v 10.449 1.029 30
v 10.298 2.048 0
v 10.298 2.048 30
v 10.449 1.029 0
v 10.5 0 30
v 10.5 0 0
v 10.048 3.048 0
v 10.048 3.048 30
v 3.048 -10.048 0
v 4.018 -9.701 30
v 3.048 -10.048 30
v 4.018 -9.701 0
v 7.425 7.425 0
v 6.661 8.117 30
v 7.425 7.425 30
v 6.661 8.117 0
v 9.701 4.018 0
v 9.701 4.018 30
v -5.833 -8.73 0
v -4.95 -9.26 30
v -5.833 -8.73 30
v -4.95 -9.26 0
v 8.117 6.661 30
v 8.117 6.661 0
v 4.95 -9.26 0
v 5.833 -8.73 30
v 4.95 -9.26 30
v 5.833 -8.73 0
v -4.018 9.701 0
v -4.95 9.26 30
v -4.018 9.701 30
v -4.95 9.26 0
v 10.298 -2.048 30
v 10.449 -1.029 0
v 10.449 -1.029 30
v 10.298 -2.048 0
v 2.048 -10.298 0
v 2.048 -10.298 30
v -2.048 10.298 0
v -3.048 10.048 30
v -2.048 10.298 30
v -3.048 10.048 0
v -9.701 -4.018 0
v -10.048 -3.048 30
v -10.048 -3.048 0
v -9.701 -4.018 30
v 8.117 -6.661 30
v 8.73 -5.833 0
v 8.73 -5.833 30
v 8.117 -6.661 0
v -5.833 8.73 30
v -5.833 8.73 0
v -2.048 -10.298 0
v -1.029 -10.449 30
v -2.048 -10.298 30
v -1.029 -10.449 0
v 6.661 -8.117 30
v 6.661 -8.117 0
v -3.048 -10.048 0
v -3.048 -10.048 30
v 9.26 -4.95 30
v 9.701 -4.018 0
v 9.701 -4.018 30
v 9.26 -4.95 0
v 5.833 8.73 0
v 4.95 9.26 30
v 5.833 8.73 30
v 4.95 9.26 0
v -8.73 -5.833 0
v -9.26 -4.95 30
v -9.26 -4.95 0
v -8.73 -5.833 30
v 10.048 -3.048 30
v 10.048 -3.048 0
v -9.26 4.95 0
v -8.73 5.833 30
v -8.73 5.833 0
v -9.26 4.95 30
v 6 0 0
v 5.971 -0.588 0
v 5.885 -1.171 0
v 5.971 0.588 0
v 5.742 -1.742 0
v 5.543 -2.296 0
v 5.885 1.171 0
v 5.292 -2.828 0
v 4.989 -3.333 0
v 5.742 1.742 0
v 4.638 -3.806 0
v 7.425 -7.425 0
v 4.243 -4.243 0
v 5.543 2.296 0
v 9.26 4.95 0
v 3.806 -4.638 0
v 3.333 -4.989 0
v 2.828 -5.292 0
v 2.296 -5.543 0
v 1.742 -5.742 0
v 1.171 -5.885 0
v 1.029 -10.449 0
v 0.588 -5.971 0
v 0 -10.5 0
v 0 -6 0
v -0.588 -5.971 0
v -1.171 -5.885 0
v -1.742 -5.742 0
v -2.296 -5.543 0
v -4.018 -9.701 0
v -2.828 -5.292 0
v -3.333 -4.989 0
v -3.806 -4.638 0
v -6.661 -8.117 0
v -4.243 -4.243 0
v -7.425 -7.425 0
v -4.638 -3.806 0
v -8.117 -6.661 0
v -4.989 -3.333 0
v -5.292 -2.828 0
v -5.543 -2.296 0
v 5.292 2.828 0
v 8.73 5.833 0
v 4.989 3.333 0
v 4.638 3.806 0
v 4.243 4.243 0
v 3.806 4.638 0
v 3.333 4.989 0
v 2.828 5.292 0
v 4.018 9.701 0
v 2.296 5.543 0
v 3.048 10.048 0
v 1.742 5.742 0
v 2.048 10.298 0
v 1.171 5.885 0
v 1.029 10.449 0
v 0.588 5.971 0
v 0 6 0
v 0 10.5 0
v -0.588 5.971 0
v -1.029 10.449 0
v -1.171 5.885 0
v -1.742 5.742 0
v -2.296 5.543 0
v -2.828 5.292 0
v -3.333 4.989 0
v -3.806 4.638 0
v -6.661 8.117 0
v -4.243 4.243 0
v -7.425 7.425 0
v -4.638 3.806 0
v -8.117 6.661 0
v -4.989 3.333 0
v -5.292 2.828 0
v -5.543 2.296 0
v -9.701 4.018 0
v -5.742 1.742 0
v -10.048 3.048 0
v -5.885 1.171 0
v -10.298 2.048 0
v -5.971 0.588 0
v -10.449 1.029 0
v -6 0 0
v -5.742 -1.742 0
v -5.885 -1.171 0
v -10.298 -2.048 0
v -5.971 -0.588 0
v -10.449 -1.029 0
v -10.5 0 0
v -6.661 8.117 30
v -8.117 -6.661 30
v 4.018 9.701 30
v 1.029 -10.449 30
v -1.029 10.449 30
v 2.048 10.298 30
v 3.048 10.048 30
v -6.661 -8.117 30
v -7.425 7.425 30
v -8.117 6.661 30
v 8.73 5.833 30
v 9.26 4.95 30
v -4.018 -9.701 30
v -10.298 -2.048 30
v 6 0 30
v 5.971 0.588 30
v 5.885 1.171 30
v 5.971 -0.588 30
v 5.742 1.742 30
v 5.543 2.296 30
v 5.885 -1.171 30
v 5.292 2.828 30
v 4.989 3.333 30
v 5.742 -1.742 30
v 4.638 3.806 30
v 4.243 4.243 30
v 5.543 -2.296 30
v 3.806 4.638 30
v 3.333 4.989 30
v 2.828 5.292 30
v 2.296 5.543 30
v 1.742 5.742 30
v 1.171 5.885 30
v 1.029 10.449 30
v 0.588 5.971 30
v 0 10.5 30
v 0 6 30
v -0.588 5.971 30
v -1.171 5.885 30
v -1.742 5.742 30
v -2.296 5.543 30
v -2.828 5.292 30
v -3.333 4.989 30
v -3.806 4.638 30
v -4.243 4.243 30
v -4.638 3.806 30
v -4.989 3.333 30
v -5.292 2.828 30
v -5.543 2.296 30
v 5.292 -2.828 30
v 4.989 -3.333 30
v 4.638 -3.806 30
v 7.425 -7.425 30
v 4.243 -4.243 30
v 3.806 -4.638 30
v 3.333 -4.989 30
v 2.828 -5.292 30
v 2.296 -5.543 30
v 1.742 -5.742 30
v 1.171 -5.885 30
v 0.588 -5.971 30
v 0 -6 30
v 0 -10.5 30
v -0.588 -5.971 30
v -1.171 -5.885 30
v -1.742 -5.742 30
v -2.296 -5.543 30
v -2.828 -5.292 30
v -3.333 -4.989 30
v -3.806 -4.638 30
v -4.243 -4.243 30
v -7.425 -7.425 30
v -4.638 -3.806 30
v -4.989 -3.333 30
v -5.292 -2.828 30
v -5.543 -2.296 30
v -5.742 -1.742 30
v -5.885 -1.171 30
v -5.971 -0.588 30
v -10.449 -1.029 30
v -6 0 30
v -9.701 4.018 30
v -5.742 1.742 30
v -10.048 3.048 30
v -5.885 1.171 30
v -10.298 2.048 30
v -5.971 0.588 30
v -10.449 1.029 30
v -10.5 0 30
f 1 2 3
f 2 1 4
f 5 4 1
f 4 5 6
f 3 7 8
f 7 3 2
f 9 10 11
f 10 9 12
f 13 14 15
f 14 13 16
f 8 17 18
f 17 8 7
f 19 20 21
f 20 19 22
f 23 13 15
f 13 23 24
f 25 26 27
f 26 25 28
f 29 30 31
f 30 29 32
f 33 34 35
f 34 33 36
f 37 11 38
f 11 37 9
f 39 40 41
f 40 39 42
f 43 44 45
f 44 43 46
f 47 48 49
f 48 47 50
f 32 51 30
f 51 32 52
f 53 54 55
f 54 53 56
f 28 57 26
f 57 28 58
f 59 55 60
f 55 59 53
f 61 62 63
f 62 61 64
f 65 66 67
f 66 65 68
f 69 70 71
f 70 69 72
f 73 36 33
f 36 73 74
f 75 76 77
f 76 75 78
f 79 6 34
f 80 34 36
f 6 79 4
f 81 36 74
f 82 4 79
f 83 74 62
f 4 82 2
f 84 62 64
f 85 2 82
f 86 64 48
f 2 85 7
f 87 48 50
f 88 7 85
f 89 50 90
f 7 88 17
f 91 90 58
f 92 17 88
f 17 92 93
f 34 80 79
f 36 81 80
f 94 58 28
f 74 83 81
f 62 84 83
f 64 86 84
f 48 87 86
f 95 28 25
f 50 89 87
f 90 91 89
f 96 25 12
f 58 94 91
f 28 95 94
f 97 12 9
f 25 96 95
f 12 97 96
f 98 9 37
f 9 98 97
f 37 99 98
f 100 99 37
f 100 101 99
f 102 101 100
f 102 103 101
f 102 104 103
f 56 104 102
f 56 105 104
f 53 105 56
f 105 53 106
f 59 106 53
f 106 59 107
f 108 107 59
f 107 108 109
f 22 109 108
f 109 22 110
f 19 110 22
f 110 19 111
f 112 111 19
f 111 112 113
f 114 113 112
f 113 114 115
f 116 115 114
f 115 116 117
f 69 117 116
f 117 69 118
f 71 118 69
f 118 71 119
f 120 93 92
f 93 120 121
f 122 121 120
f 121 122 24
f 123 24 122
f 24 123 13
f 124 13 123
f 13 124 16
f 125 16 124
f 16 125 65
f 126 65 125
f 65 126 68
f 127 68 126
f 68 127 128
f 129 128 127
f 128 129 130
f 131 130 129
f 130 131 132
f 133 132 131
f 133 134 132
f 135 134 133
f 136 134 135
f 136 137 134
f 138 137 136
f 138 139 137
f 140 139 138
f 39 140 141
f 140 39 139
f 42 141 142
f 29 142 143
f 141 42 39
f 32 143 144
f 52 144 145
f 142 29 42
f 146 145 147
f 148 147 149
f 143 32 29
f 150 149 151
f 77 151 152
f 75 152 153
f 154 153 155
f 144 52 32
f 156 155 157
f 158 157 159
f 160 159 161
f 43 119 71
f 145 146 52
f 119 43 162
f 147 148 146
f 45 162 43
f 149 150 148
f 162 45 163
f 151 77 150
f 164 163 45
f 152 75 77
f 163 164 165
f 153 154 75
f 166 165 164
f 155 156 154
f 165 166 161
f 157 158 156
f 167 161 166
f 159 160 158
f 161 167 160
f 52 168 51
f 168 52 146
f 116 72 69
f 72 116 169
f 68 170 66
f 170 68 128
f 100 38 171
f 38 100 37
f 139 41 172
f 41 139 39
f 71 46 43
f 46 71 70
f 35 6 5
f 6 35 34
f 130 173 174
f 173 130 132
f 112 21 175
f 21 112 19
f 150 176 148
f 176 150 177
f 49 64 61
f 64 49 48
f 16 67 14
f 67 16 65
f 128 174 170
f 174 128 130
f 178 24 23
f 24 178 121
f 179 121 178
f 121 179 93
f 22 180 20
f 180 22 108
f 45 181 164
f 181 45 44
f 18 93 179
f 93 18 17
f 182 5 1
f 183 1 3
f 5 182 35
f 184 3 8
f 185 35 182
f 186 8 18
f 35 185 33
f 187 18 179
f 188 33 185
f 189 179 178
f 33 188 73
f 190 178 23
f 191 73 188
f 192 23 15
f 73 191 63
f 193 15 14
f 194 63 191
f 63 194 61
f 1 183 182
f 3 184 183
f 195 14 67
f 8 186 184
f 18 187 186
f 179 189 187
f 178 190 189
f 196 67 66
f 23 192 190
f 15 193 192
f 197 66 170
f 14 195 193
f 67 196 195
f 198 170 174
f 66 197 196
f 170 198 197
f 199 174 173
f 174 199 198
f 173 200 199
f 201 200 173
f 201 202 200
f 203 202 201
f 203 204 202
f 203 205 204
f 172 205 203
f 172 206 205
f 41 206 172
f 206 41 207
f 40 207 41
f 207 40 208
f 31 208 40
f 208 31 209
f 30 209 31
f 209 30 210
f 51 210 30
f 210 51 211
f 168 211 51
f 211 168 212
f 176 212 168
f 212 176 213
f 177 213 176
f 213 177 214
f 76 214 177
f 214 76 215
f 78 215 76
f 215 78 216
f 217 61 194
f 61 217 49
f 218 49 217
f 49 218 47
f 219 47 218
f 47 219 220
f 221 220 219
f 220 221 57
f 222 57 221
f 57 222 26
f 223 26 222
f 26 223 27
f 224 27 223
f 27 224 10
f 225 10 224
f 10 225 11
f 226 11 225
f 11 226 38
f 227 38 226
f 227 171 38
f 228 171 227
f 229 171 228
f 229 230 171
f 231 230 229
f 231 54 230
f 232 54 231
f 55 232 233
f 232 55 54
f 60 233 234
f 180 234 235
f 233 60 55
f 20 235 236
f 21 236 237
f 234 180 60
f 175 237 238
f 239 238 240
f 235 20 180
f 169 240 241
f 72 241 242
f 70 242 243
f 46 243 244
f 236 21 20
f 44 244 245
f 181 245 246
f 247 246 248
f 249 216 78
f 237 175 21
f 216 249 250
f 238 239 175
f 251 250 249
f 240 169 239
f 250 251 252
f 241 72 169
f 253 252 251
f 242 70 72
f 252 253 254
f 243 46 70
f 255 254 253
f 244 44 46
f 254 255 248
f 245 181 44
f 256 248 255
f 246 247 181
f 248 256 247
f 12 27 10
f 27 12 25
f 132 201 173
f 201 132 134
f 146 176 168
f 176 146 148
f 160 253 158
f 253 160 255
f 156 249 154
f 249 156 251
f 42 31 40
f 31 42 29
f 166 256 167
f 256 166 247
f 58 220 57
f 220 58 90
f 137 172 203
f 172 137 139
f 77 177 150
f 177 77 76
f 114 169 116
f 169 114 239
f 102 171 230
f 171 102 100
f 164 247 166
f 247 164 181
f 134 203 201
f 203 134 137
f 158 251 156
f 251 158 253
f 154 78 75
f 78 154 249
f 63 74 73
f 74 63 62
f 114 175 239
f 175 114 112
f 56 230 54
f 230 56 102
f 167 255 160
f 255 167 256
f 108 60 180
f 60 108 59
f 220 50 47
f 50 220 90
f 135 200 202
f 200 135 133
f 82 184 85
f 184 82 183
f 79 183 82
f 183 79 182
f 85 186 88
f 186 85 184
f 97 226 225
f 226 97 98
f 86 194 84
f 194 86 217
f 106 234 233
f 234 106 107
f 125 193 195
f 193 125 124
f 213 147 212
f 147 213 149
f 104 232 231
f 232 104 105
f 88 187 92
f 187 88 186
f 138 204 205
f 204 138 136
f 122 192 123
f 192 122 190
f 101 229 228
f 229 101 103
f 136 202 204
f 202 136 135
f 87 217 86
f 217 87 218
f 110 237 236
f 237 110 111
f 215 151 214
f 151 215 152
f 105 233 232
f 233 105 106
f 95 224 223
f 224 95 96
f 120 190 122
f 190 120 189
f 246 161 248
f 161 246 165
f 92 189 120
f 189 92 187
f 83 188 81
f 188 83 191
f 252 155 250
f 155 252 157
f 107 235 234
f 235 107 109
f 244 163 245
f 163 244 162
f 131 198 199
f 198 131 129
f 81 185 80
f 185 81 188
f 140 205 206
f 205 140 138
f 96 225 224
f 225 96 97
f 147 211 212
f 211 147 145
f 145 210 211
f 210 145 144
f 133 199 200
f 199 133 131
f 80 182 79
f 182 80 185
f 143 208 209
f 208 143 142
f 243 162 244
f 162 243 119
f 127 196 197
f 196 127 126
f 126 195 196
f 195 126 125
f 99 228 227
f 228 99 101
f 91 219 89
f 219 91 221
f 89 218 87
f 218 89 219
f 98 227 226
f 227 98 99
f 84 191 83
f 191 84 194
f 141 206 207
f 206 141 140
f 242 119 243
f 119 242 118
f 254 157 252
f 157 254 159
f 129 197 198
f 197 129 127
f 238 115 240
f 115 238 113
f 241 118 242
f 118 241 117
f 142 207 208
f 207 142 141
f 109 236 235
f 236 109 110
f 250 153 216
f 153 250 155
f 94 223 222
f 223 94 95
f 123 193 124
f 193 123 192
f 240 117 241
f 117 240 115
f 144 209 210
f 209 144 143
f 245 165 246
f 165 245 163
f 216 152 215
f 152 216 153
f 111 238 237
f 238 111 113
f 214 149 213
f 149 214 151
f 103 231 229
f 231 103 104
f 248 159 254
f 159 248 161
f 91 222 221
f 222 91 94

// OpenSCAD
difference() {
    cylinder(h=30.0, d=21.0, $fn=64);
    translate([0, 0, -1]) // Extend slightly to ensure clean subtraction
        cylinder(h=32.0, d=12.0, $fn=64);
}
